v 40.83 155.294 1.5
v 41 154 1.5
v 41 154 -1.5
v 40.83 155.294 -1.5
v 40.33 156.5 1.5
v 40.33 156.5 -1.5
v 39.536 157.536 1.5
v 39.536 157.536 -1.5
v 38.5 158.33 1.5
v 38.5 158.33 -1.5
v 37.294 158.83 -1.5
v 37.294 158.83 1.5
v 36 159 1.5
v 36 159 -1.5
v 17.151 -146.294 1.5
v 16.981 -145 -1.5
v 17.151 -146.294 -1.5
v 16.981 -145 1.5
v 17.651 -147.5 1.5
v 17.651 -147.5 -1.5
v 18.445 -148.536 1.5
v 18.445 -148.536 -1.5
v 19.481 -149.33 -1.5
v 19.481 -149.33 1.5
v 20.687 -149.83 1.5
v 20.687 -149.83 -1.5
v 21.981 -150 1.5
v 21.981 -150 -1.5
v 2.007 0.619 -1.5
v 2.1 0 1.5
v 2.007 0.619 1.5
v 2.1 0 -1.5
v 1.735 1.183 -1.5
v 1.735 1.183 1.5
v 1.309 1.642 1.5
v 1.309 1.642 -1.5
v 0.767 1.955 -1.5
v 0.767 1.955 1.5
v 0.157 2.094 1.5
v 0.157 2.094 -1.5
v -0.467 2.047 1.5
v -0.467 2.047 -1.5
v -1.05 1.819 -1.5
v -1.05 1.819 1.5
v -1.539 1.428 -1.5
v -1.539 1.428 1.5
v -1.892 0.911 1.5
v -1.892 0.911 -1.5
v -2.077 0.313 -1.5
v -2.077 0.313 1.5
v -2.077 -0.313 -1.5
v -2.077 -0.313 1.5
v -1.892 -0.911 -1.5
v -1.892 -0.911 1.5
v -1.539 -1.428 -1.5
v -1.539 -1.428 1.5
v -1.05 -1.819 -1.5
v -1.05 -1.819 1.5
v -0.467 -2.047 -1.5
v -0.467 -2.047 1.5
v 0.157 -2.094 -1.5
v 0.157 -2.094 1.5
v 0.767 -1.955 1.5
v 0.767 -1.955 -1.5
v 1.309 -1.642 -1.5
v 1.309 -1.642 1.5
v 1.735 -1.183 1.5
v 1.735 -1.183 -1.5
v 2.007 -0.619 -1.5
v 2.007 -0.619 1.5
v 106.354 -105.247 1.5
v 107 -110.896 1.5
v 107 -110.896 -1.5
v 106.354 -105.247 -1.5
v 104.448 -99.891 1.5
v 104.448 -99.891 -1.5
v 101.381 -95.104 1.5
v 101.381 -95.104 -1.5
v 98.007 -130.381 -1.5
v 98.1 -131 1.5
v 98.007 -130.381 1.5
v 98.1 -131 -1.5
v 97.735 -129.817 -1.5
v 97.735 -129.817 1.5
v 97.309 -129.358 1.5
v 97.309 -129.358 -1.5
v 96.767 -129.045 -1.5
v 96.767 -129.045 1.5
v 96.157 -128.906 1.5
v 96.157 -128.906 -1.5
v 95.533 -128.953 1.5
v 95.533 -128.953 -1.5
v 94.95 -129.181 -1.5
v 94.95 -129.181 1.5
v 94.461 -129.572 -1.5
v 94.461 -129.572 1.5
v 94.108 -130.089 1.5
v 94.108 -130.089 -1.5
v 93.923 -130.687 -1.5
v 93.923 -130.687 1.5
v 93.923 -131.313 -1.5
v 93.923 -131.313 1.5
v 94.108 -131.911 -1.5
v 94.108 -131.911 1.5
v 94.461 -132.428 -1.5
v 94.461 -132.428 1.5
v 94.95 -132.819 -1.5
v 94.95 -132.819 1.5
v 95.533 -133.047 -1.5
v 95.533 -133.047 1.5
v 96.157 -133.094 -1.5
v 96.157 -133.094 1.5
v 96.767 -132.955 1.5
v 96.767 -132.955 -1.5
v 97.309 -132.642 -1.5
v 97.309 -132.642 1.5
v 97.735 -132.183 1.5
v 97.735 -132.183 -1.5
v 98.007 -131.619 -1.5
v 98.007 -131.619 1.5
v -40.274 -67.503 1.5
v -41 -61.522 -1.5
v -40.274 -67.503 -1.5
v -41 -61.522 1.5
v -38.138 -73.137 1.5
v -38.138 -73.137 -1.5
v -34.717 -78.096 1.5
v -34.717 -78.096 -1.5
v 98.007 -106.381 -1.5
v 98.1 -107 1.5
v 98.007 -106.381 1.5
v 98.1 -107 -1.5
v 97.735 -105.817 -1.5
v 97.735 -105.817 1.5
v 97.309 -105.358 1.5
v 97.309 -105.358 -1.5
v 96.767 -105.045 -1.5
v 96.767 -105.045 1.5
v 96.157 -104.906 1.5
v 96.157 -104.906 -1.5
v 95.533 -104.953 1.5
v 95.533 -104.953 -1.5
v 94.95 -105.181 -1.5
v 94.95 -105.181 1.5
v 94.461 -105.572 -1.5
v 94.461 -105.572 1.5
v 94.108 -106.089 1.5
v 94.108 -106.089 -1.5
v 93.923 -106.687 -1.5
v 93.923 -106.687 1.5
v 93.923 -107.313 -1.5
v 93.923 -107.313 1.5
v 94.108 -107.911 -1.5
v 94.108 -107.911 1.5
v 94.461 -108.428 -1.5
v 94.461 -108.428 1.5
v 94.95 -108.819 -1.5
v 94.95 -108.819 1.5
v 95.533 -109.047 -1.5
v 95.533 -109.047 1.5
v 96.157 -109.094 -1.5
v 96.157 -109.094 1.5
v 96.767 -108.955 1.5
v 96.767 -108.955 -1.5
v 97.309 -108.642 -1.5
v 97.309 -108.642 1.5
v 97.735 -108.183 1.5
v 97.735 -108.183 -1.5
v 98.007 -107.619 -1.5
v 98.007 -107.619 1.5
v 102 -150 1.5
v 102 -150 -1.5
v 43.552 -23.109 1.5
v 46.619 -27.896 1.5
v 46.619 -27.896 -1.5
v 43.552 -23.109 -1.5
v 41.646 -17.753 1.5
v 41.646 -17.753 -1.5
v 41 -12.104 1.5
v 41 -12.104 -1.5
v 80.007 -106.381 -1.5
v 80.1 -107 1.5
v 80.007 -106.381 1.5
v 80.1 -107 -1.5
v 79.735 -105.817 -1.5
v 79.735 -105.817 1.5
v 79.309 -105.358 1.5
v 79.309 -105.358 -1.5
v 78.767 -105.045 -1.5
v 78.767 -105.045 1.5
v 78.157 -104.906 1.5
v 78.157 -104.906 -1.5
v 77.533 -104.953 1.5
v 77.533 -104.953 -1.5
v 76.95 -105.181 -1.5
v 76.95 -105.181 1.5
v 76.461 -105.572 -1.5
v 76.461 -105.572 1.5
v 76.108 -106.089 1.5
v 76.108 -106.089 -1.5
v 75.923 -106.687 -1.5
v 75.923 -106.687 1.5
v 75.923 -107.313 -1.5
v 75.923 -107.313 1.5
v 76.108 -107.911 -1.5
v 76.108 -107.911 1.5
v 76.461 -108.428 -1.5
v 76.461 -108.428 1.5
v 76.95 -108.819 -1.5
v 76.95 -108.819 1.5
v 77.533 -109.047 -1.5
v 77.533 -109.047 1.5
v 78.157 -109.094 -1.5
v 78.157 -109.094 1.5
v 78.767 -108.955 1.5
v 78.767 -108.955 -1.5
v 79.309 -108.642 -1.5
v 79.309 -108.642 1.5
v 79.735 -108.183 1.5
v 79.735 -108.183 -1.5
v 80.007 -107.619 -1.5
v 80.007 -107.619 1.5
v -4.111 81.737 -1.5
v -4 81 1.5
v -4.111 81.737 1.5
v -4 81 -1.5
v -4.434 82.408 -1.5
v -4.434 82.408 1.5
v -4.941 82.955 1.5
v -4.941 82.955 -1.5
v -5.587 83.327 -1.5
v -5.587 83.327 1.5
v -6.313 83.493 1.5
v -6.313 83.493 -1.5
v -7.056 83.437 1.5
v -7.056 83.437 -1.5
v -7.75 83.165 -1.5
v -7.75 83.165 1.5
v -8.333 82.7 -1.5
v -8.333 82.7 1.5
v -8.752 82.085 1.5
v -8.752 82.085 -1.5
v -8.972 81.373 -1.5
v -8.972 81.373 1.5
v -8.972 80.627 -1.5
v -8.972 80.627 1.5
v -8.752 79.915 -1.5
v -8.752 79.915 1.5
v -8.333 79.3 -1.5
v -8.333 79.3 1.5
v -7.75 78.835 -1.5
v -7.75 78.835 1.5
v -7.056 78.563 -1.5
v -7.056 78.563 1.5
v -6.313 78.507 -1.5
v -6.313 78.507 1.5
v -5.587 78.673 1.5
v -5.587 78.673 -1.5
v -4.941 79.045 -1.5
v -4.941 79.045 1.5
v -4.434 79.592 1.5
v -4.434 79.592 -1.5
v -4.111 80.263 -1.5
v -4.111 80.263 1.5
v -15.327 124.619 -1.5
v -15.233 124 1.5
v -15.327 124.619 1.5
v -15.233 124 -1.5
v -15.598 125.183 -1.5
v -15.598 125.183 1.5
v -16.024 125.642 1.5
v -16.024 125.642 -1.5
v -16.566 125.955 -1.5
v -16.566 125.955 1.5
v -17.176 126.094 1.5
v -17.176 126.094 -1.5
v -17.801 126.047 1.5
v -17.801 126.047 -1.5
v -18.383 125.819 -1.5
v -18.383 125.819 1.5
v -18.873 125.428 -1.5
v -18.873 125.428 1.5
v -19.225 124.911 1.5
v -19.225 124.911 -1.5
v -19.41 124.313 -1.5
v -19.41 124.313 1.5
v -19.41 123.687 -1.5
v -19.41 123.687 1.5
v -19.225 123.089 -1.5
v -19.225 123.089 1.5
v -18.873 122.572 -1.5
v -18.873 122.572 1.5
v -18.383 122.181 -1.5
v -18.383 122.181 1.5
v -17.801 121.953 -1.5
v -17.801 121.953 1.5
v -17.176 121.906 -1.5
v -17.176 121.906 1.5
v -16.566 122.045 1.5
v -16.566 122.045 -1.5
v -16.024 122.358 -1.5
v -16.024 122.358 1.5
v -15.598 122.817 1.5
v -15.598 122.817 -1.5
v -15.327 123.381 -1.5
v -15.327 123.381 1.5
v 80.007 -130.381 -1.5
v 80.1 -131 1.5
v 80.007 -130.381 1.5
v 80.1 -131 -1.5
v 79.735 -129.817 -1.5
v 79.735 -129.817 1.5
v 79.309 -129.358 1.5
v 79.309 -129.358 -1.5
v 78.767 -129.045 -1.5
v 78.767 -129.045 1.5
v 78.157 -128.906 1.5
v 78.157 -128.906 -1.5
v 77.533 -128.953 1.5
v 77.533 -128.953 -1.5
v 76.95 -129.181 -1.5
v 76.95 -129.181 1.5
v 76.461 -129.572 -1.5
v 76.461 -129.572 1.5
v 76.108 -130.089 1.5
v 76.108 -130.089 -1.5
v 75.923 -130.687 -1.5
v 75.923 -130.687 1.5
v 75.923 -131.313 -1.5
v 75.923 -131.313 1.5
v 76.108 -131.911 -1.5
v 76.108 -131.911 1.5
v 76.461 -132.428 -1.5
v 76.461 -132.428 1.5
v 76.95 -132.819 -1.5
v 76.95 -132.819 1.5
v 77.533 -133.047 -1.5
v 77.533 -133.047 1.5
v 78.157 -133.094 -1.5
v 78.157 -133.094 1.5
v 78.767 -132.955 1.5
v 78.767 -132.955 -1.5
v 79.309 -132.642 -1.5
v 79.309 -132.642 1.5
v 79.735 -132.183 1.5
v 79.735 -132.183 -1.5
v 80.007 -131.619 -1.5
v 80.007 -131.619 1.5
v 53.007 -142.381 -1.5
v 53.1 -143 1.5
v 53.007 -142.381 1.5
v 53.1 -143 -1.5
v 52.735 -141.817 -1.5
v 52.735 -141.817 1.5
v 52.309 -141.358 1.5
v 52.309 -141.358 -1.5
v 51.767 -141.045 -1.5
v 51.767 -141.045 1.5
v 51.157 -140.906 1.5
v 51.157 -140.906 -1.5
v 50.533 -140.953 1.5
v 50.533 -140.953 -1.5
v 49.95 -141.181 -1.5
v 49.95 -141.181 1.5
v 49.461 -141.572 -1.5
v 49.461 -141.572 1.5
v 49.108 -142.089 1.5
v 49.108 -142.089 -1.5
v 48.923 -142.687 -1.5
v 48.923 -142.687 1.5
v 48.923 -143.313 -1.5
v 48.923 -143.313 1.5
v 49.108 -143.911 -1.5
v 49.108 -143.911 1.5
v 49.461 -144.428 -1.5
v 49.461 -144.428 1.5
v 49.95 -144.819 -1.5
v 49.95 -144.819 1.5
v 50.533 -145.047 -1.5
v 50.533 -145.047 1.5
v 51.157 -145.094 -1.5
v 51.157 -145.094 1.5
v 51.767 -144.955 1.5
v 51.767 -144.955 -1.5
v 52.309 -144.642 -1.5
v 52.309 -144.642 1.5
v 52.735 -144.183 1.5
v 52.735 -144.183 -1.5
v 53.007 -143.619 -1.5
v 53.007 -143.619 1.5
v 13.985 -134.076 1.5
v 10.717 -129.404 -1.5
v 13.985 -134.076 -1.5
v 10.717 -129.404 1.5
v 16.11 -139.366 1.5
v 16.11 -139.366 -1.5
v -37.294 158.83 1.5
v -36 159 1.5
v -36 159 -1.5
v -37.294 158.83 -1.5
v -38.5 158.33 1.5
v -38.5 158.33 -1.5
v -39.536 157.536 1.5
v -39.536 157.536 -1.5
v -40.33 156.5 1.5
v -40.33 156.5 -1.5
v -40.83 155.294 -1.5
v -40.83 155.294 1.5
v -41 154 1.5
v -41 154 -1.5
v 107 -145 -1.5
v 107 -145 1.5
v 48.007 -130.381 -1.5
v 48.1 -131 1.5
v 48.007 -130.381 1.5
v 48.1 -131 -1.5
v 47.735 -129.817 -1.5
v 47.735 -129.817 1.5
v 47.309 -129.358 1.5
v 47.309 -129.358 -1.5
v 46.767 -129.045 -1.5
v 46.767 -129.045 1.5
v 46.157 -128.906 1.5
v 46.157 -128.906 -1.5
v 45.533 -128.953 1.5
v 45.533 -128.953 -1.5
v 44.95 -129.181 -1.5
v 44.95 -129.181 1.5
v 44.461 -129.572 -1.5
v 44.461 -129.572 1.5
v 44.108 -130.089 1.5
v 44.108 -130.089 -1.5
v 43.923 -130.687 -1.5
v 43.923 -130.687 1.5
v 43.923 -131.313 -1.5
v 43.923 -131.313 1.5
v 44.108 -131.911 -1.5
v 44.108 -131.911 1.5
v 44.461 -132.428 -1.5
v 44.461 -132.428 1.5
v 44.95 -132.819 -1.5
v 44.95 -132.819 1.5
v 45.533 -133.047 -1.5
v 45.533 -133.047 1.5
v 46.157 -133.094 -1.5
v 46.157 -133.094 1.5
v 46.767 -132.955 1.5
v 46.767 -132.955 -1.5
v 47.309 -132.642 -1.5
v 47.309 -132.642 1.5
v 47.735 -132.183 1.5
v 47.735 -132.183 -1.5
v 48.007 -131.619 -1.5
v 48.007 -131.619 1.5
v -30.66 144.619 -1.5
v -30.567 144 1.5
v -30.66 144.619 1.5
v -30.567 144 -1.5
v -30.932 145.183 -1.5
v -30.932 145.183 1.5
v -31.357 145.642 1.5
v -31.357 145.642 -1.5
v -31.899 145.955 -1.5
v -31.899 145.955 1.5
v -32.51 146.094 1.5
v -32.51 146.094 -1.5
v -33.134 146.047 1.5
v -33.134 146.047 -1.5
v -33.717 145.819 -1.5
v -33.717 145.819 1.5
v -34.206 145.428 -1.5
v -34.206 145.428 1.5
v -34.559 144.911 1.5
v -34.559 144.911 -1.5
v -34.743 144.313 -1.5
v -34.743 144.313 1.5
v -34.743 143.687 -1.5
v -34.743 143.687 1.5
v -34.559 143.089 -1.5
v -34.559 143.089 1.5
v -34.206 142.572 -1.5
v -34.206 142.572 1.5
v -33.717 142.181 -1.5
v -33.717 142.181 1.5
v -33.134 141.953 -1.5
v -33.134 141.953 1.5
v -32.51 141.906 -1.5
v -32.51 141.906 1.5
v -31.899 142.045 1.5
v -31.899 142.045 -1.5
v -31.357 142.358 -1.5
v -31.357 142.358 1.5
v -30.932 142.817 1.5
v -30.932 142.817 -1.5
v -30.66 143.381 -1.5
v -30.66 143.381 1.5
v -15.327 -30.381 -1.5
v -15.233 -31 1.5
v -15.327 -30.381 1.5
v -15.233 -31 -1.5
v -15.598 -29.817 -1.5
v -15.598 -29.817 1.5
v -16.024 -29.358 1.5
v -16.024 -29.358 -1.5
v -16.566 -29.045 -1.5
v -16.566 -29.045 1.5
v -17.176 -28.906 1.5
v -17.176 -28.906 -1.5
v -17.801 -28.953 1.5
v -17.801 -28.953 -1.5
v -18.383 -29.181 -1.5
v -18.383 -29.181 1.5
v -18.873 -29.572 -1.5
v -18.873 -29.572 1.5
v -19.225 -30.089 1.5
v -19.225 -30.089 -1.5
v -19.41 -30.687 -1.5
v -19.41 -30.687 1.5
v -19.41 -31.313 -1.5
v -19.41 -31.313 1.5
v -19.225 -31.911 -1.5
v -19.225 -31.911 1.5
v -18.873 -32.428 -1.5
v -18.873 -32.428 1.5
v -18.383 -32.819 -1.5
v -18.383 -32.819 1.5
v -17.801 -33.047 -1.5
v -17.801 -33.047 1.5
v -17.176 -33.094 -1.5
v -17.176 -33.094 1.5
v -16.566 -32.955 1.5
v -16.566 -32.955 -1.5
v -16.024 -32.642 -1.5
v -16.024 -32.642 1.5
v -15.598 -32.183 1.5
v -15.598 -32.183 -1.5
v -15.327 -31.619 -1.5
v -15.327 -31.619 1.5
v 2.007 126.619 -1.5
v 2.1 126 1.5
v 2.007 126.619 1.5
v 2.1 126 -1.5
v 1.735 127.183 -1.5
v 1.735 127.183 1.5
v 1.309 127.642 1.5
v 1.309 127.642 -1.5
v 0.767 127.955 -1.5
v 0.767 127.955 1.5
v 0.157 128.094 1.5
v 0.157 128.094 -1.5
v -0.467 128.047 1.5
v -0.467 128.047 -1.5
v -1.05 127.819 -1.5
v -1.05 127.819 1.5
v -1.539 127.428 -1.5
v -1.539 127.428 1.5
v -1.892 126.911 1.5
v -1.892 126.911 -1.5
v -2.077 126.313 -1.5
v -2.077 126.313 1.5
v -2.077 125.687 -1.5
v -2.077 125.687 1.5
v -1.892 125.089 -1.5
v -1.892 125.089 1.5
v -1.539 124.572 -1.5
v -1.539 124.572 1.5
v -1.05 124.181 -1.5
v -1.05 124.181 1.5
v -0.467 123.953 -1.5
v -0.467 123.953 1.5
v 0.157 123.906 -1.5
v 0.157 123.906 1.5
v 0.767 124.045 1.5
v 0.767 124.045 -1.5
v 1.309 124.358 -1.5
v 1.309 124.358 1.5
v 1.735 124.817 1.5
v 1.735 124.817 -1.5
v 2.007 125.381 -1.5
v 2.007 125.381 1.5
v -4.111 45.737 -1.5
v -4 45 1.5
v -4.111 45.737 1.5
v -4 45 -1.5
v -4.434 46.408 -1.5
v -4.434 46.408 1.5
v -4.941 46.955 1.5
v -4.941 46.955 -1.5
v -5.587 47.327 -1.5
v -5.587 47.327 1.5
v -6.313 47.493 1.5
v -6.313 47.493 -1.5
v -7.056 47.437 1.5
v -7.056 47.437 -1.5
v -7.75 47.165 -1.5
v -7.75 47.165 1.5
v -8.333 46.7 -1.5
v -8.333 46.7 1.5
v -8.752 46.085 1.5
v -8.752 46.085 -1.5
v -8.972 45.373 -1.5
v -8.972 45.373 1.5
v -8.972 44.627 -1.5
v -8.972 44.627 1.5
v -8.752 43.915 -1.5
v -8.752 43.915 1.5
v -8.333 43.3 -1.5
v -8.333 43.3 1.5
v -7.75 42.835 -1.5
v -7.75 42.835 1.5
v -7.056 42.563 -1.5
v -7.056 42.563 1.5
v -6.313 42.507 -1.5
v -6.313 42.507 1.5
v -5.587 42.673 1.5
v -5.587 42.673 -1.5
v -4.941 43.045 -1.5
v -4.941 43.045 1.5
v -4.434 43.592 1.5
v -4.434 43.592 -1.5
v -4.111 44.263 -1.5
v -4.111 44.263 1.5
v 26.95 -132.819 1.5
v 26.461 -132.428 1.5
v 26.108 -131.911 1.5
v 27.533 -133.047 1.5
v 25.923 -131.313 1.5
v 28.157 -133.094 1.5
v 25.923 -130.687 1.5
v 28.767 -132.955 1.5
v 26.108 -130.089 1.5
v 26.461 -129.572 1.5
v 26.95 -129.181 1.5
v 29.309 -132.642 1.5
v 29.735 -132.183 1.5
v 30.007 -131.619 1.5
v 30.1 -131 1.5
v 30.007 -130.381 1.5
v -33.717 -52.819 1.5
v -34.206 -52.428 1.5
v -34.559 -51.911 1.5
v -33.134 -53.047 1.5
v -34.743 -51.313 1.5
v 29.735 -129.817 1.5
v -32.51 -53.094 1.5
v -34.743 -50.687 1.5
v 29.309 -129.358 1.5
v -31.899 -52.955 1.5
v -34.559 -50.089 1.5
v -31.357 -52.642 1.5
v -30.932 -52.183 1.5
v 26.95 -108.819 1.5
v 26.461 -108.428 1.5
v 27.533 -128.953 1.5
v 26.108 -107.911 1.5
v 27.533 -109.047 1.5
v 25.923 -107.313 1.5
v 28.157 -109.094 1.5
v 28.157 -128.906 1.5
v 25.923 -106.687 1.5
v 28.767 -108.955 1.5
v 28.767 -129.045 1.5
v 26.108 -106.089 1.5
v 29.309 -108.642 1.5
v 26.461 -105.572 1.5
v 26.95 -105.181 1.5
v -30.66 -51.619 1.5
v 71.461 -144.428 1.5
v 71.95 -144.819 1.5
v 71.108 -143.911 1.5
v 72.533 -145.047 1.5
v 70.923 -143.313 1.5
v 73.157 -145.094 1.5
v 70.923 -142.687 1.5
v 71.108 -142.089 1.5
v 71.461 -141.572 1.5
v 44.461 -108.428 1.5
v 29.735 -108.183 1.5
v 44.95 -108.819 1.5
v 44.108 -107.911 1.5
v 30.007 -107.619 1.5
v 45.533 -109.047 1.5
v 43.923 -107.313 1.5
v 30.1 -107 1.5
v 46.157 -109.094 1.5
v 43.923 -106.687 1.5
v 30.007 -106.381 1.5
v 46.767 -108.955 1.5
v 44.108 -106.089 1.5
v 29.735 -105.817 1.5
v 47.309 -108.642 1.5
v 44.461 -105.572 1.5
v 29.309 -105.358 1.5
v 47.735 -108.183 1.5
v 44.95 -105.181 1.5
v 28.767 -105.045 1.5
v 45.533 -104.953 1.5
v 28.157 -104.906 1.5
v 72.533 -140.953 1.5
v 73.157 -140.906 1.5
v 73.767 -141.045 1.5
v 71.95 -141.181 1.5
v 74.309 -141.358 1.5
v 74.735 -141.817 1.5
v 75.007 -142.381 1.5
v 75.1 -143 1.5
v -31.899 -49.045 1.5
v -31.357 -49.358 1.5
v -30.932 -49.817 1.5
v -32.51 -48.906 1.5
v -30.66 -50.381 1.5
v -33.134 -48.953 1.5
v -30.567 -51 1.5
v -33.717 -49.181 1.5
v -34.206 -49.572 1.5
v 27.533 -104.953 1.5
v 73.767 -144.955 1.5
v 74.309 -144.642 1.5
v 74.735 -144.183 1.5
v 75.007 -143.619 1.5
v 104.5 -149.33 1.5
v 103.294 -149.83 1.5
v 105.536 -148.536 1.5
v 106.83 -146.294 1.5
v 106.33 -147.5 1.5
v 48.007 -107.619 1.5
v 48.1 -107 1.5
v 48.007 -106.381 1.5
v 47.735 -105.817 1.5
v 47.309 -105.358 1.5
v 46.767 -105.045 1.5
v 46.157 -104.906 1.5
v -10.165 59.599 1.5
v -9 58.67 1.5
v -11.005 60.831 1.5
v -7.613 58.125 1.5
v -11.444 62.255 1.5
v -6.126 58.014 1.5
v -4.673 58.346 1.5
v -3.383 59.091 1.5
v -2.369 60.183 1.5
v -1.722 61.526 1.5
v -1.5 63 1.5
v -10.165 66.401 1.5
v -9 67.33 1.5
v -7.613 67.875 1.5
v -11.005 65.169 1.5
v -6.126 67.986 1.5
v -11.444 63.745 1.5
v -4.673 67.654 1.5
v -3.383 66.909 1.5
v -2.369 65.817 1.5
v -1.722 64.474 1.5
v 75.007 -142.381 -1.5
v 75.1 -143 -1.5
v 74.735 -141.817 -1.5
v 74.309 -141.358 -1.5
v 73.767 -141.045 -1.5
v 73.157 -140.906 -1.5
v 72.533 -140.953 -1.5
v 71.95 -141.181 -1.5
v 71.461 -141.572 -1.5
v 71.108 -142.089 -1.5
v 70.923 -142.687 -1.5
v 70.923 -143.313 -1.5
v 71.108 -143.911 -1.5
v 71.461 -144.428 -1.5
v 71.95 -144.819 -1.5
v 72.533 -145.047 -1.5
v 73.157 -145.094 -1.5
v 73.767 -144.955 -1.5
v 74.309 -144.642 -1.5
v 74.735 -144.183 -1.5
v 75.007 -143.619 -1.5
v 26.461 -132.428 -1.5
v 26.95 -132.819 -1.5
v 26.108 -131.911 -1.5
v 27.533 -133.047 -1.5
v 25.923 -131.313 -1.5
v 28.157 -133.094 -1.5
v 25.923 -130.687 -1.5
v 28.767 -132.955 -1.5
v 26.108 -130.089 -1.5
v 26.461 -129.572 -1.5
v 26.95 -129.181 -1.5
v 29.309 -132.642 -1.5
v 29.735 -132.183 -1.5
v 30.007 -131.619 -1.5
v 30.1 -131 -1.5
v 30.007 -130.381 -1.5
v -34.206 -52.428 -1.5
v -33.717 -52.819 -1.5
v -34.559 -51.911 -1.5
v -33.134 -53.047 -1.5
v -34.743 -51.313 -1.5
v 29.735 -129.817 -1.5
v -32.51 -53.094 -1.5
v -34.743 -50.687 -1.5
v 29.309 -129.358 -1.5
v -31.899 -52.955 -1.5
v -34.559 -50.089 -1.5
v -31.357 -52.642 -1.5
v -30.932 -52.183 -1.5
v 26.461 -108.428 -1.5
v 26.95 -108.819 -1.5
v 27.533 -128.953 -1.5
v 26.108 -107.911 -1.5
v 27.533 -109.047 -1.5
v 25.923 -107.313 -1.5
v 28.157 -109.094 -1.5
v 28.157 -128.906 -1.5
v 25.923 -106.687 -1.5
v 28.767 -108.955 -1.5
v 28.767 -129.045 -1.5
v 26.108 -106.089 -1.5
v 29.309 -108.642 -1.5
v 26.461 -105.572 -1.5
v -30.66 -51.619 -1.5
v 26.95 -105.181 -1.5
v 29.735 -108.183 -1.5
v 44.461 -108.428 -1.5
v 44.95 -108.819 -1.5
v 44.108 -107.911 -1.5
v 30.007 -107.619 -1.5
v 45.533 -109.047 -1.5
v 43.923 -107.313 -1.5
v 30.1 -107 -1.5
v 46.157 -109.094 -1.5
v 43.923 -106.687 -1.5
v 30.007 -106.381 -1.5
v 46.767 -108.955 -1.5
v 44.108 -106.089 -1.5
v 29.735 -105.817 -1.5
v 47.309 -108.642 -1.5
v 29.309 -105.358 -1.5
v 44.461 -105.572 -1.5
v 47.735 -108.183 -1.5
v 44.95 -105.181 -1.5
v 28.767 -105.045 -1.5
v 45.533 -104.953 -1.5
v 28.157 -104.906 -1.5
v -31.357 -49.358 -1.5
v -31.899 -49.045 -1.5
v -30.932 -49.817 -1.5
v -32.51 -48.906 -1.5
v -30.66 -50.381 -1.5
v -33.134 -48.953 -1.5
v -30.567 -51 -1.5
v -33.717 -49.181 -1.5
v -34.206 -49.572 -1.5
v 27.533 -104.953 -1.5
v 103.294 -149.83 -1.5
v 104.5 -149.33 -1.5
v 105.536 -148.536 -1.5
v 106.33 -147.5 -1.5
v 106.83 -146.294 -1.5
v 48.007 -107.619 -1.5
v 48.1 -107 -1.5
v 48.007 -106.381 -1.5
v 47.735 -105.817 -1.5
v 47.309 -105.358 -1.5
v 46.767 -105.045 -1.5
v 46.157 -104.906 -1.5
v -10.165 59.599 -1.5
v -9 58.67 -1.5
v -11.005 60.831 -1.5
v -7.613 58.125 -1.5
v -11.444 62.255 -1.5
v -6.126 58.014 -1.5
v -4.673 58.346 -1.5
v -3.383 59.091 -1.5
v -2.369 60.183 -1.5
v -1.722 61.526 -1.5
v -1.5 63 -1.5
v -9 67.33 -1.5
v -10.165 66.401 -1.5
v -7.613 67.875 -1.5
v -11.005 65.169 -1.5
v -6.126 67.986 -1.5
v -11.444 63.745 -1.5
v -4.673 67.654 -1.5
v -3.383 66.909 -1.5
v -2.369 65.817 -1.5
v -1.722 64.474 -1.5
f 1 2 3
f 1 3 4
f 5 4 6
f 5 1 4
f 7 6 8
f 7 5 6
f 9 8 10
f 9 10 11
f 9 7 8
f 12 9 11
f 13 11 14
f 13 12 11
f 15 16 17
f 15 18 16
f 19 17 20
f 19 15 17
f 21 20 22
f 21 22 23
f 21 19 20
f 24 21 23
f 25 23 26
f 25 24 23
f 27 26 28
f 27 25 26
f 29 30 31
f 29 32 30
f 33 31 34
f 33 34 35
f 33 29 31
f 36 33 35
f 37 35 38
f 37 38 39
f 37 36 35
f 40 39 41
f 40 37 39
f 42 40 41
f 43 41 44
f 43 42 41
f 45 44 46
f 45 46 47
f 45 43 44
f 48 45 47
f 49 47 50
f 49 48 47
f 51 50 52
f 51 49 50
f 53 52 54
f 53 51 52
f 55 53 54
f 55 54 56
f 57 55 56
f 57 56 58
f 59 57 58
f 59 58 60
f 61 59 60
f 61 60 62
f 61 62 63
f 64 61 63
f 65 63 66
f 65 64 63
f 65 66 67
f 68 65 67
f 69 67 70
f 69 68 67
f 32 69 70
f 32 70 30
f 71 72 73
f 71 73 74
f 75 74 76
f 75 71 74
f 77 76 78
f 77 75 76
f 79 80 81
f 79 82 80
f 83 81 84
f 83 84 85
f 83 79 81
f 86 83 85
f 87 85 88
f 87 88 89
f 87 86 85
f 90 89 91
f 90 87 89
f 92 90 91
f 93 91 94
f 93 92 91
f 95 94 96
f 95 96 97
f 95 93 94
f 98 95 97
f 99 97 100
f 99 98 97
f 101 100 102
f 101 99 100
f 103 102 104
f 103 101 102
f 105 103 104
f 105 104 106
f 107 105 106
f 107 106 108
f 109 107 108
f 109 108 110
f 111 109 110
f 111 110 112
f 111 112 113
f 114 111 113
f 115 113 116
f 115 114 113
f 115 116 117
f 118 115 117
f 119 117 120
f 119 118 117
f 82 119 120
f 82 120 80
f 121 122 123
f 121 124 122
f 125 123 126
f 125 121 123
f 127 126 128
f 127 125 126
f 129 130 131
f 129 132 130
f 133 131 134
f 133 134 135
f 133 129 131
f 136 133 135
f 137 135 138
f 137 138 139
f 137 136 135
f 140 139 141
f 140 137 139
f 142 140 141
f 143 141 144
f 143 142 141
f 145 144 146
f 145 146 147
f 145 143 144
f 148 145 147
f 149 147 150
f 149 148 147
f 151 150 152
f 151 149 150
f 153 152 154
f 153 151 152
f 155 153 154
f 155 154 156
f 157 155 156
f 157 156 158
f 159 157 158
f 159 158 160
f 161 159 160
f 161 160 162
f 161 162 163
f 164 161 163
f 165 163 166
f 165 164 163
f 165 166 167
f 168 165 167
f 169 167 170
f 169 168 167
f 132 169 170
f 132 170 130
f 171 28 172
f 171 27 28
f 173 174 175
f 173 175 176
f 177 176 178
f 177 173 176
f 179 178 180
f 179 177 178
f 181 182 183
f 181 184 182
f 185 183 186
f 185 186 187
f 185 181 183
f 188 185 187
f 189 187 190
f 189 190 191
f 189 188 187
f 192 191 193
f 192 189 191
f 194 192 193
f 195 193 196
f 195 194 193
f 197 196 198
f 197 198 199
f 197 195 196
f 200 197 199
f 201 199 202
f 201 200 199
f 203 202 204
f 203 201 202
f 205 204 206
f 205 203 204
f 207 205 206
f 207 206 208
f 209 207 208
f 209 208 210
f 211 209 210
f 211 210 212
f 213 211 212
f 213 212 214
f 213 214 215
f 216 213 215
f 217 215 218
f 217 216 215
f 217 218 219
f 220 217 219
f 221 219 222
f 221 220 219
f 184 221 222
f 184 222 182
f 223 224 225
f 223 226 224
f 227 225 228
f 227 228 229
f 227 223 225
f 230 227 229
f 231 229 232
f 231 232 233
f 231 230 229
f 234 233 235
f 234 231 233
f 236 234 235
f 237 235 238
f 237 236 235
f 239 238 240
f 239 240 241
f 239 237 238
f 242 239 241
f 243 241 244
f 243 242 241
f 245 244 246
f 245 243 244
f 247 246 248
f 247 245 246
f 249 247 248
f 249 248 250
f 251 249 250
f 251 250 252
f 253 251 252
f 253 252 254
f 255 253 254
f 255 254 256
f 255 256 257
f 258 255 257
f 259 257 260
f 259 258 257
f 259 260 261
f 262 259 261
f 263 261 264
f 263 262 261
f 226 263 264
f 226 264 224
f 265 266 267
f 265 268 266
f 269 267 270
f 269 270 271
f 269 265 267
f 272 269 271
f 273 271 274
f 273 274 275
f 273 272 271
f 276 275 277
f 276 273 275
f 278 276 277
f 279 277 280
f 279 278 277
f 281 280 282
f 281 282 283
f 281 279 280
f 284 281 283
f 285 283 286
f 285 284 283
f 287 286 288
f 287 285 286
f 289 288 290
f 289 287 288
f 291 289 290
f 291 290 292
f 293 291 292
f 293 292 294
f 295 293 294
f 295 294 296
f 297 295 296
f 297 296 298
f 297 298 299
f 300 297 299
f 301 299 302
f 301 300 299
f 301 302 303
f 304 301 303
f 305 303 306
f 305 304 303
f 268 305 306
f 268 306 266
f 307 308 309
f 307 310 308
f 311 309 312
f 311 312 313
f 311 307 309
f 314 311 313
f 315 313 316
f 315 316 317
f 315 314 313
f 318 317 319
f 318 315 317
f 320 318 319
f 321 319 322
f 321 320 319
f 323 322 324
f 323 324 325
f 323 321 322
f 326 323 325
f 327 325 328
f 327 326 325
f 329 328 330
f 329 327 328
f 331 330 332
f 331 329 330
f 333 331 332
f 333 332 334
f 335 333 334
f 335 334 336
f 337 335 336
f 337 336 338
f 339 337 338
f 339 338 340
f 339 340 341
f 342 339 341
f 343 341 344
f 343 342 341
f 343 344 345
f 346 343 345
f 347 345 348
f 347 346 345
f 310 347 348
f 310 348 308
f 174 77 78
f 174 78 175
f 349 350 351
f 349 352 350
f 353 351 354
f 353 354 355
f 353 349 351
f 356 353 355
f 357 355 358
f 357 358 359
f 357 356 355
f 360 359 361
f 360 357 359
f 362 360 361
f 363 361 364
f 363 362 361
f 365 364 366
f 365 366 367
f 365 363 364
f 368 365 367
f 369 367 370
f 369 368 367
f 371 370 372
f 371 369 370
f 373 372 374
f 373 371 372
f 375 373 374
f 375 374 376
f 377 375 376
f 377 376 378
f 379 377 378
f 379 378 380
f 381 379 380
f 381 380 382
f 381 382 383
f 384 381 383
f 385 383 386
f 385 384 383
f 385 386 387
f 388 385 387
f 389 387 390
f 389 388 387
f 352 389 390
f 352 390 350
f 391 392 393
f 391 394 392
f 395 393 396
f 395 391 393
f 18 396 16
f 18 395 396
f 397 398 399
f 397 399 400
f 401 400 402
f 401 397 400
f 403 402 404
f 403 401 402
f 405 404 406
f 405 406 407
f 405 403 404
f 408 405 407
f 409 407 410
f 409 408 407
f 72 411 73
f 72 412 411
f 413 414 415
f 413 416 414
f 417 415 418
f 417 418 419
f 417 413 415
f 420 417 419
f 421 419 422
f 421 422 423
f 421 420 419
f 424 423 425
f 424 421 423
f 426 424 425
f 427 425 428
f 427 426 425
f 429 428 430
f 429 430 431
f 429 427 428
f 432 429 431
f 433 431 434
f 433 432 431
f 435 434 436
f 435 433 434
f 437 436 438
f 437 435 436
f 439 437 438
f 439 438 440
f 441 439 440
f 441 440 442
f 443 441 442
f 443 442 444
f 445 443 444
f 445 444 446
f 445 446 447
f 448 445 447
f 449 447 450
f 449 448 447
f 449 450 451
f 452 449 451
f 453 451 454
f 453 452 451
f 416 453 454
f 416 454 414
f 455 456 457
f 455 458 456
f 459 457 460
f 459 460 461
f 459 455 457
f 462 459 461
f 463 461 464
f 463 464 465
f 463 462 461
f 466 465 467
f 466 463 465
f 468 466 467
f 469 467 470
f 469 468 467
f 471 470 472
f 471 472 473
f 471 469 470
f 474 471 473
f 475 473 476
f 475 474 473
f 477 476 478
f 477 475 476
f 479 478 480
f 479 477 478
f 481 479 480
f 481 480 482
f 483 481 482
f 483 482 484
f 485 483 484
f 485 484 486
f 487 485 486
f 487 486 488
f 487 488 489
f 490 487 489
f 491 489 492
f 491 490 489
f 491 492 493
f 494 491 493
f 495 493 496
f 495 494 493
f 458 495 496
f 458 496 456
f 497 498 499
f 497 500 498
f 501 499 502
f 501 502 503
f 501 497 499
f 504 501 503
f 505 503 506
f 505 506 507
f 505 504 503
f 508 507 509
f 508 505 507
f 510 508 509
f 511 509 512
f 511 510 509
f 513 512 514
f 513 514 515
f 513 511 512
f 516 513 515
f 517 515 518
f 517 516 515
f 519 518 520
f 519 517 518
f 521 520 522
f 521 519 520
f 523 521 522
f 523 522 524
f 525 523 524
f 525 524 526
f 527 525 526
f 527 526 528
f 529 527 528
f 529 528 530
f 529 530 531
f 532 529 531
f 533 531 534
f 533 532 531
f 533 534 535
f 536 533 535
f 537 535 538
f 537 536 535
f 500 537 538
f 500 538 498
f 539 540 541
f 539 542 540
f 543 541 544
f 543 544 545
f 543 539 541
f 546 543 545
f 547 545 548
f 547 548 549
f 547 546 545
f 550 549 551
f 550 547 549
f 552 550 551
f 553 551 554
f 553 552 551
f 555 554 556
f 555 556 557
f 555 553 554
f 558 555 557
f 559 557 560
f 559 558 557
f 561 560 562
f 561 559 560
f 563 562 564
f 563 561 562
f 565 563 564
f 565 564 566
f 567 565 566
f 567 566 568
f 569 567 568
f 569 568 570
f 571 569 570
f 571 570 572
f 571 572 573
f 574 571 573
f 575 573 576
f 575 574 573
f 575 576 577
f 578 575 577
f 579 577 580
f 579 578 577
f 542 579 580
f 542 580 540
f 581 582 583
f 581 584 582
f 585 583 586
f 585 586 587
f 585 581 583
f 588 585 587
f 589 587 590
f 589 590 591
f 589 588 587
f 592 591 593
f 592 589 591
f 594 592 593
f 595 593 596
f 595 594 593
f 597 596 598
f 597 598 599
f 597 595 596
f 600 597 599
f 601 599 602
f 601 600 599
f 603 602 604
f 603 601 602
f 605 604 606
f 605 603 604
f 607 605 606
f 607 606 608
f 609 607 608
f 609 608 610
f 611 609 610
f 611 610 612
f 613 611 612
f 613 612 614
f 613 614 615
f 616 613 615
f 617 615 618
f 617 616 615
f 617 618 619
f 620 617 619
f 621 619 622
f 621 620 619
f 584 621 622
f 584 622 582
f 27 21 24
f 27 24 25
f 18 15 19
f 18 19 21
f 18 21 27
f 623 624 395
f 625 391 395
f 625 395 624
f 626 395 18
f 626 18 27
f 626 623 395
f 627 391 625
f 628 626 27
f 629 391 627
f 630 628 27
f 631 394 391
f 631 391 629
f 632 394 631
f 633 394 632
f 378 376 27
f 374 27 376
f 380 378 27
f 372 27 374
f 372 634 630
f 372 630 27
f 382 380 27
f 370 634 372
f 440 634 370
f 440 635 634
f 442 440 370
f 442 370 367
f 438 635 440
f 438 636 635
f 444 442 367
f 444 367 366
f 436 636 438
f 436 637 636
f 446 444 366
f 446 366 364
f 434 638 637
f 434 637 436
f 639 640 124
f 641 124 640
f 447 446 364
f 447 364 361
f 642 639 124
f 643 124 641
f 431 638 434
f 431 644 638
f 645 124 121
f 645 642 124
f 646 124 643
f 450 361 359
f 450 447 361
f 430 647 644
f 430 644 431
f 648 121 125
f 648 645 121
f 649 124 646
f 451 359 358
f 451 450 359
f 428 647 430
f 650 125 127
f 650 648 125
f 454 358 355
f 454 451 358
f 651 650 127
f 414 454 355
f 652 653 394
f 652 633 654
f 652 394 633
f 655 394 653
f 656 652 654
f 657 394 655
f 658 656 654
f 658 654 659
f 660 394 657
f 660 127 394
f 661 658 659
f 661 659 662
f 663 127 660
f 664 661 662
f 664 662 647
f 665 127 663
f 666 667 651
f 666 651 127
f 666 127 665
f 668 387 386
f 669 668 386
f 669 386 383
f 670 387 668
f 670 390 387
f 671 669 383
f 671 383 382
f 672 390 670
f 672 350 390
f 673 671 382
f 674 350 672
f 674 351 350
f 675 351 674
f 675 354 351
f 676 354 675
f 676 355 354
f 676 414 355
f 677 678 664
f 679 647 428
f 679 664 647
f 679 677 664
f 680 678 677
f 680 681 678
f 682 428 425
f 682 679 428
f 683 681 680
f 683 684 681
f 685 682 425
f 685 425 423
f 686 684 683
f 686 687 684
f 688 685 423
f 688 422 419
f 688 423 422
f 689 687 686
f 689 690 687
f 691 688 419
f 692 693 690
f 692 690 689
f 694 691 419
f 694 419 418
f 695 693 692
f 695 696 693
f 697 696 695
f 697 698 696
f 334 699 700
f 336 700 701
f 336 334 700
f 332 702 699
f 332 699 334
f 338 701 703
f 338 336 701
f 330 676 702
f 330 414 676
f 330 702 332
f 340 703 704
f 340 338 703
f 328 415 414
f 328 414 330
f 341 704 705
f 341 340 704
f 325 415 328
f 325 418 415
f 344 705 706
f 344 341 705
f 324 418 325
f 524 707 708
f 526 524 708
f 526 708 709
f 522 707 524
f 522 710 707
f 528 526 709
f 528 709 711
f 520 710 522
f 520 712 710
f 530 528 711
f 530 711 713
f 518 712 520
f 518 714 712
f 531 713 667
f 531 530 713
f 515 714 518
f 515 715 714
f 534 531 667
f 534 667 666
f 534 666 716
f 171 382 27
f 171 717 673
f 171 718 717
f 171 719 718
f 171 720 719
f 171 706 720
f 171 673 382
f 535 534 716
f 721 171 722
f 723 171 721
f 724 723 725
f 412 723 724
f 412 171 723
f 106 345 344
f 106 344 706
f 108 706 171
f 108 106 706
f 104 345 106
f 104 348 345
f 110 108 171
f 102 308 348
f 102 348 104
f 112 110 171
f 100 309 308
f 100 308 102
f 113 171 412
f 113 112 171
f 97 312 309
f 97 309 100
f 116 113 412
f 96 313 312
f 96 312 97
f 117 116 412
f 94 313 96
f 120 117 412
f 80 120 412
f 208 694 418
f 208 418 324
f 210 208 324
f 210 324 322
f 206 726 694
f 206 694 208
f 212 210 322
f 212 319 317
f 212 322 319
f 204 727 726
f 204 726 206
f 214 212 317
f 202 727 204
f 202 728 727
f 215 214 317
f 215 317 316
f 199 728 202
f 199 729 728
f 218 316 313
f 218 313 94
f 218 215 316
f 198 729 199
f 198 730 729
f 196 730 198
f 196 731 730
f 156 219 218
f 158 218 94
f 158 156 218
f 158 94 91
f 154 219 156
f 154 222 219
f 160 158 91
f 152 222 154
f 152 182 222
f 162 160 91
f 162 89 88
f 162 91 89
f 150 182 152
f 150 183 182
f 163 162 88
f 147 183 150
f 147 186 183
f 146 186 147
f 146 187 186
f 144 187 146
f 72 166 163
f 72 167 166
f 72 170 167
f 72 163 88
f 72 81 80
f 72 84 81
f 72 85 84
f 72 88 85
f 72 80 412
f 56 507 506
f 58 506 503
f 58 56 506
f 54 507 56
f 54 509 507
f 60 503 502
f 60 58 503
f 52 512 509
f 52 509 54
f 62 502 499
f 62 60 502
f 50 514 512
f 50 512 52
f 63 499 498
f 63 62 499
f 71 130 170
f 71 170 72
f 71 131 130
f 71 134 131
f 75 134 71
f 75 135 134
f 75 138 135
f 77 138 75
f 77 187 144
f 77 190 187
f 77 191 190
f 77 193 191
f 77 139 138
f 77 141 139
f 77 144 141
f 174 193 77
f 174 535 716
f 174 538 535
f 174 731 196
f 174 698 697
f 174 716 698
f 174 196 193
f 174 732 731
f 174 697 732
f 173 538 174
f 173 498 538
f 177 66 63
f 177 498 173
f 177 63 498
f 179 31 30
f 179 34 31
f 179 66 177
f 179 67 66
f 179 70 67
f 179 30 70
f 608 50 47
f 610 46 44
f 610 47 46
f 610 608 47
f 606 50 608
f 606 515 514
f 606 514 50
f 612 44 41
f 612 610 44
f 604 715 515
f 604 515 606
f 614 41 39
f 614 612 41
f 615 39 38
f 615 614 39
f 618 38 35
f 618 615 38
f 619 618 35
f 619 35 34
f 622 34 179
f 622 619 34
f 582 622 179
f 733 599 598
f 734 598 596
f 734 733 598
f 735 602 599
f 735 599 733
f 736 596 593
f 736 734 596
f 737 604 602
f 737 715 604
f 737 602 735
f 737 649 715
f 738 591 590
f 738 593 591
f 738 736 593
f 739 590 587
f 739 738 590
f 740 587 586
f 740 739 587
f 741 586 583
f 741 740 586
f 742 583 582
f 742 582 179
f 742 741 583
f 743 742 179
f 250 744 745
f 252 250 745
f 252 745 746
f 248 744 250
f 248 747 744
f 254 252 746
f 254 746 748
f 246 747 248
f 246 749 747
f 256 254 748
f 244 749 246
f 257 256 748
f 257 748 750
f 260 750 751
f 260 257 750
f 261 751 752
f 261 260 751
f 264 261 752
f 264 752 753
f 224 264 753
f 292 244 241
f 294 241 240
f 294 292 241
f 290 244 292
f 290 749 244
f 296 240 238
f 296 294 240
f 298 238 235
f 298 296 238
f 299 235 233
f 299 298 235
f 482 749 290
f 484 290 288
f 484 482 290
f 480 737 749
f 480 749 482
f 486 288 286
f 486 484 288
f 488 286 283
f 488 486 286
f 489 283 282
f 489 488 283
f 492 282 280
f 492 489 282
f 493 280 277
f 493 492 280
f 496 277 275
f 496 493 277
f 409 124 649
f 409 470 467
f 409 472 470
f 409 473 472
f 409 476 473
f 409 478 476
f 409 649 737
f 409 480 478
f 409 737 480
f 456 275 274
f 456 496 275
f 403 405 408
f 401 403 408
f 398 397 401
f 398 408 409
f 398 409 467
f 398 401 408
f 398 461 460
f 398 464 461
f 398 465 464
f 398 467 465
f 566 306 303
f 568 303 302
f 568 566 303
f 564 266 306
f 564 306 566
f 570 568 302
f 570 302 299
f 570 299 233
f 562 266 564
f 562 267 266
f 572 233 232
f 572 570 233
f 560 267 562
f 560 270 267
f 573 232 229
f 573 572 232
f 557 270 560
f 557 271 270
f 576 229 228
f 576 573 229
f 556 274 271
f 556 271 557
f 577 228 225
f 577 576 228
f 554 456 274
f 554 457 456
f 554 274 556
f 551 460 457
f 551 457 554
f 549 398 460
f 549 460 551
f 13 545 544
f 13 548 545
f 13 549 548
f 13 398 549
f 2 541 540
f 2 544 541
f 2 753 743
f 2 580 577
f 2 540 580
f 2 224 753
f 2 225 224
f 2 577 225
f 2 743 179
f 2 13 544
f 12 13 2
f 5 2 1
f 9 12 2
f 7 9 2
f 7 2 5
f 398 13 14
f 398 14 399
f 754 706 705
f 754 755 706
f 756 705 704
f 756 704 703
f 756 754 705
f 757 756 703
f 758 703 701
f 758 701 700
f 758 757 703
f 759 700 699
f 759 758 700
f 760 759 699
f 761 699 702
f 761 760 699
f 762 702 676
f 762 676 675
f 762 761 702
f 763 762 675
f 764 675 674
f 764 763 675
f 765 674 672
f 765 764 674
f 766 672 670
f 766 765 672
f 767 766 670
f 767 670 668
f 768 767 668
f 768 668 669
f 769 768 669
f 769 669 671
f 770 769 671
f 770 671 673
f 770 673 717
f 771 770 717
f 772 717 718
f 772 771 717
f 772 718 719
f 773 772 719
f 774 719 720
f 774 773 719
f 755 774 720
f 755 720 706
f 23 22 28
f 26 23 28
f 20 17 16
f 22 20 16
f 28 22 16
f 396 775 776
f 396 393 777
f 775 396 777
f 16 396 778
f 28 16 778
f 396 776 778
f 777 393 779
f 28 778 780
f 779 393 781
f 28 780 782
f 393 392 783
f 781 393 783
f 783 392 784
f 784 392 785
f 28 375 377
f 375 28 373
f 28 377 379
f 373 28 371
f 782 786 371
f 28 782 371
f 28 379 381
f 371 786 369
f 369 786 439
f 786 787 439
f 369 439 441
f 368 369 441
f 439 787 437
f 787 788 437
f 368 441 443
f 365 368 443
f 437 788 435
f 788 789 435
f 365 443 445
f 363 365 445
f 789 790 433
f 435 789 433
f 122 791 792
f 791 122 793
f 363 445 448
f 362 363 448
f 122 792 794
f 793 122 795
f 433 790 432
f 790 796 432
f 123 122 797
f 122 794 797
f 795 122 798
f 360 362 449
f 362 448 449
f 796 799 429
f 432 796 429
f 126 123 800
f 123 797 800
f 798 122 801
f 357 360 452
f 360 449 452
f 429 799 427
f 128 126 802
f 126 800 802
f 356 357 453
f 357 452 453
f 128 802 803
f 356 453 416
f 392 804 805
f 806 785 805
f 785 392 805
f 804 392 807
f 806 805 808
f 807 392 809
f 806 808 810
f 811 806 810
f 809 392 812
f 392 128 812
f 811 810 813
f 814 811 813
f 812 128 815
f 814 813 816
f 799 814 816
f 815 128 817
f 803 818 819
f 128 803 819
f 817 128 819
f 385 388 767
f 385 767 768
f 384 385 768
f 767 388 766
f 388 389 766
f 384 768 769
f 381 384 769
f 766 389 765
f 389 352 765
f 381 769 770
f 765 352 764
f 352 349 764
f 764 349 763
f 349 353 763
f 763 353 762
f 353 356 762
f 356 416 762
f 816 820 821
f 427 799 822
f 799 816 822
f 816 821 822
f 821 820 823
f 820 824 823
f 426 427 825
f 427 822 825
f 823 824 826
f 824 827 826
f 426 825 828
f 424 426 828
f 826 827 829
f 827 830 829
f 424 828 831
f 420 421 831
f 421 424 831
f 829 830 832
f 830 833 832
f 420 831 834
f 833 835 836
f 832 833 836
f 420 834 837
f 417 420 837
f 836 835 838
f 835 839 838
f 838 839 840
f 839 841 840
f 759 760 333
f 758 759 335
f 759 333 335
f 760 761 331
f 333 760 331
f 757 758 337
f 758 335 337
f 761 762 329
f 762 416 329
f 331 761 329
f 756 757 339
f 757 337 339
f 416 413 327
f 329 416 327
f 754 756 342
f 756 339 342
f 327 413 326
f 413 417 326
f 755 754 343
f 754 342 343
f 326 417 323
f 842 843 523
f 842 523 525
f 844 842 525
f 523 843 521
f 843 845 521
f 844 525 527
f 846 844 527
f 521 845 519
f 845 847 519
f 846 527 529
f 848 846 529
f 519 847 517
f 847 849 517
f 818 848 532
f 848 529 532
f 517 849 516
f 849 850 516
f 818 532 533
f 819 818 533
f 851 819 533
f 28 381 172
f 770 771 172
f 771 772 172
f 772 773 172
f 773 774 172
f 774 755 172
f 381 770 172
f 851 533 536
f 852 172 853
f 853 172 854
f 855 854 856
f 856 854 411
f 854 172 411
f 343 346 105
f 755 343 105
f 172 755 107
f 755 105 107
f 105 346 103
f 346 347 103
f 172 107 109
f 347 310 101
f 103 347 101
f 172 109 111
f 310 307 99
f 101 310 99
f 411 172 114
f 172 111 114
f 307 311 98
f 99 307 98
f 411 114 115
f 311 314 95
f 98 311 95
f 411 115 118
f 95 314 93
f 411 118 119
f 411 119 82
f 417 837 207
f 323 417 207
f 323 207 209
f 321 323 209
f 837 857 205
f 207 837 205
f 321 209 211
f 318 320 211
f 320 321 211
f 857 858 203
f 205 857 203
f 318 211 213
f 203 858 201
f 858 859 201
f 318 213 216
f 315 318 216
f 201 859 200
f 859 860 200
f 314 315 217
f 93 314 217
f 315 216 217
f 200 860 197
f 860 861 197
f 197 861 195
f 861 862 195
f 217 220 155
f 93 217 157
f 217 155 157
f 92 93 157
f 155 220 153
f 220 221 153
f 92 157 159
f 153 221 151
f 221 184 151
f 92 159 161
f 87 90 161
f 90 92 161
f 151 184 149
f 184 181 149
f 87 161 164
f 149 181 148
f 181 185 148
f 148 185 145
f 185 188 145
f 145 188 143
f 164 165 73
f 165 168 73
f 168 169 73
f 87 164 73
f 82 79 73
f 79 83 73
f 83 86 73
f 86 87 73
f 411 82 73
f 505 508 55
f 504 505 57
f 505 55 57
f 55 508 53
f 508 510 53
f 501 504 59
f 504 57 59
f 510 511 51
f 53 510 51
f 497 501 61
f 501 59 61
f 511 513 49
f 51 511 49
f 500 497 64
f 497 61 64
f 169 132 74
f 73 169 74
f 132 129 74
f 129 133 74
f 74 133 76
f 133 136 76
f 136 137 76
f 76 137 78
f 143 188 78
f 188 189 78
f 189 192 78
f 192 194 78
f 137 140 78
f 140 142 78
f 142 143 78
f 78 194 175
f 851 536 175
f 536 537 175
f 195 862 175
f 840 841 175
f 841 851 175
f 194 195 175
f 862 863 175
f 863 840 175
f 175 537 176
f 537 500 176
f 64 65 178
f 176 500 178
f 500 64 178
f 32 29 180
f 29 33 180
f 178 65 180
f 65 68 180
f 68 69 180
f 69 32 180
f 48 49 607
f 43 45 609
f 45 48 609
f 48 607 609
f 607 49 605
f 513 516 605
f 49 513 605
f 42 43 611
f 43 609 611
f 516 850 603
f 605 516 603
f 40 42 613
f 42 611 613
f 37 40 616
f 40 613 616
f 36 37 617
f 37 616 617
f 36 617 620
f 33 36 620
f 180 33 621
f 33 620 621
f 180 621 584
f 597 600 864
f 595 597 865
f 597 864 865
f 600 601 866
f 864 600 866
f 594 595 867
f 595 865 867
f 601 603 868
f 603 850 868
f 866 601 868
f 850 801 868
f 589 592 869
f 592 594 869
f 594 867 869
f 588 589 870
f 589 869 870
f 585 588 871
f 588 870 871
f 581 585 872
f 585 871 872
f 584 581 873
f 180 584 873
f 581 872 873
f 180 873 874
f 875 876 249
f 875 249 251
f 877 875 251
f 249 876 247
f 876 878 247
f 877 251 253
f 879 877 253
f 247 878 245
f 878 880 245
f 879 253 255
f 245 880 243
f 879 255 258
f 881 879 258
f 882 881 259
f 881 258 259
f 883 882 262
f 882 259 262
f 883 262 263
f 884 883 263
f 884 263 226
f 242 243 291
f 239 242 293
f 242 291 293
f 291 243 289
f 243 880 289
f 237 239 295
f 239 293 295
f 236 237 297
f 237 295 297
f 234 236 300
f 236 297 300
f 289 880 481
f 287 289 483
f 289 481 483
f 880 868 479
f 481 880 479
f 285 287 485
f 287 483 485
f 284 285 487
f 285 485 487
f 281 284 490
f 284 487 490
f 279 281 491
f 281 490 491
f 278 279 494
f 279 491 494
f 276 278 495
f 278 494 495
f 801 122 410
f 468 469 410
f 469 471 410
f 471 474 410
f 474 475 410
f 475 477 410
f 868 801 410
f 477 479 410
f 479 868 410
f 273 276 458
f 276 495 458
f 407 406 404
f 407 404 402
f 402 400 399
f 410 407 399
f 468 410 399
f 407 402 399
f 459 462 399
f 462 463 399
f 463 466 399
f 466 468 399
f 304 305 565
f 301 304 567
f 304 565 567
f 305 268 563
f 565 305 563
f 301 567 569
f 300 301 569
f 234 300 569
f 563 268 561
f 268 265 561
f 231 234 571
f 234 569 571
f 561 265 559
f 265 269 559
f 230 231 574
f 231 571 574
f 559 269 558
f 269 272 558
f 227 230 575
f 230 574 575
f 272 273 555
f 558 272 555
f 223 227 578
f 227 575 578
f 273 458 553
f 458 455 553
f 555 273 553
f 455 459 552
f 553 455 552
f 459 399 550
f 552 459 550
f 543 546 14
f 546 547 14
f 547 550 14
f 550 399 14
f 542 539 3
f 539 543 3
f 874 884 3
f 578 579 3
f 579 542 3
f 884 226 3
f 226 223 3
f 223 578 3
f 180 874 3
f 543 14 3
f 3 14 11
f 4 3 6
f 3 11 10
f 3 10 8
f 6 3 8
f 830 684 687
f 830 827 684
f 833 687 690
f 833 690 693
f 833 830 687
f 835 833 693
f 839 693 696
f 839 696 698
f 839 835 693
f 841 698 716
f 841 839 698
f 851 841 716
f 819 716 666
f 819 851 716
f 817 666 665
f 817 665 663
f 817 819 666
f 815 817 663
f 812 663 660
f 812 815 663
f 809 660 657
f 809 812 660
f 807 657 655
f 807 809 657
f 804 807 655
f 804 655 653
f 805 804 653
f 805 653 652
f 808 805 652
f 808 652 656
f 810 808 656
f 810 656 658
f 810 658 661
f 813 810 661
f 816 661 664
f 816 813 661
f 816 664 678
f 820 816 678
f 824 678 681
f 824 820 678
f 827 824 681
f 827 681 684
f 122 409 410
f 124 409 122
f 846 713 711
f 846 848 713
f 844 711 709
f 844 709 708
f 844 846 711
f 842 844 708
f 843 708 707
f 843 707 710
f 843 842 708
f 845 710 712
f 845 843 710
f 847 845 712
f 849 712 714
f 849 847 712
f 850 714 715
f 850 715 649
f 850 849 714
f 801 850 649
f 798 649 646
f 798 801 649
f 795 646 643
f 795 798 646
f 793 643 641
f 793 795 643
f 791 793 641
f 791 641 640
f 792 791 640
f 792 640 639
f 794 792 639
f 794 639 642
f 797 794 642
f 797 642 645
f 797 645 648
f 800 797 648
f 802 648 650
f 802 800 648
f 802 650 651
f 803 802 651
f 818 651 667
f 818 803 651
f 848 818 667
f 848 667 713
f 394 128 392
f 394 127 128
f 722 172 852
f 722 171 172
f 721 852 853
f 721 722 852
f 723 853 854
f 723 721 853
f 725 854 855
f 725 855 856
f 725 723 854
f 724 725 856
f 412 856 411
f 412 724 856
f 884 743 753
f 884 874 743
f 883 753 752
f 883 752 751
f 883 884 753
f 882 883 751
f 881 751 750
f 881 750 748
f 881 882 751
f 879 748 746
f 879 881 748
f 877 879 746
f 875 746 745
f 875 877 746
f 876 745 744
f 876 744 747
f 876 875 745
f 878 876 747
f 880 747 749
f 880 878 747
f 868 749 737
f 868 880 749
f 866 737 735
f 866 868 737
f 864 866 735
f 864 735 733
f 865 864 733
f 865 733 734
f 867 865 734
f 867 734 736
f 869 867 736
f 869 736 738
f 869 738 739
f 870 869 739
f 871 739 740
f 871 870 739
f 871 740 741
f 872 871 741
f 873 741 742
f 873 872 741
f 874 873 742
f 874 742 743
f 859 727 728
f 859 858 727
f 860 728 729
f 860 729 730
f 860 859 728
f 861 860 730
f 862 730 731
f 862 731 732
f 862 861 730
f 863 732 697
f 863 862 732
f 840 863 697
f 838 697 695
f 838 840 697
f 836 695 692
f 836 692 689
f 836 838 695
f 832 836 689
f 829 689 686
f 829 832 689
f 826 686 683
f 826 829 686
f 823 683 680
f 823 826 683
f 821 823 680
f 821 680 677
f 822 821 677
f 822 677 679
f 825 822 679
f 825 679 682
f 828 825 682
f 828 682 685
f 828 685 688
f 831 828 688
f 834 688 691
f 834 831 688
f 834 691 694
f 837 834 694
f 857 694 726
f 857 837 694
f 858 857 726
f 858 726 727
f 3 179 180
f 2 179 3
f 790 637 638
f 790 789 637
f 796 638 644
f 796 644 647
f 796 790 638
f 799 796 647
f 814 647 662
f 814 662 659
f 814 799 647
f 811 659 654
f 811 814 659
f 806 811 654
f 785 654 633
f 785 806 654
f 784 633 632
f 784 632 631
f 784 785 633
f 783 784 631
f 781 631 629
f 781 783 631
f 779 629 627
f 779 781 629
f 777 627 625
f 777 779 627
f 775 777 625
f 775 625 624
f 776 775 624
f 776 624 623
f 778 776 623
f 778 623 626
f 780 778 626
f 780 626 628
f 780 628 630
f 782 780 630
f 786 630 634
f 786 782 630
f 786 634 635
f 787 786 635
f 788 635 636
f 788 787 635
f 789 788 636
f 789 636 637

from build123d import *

# Parameters (mm, degrees)
SKETCH1_R           = 2.1
SKETCH1_R_2         = 2.5
SKETCH1_R_3         = 5
BOSS_EXTRUDE1_DEPTH = 1.5


with BuildPart() as part:
    # Sketch1 → Boss-Extrude1 (new body, symmetric)
    with BuildSketch(Plane.XY):
        with BuildLine():
            Line((107, -145), (107, -110.895624471))
            ThreePointArc((107, -110.895624471), (105.553363517, -102.514749396), (101.380874638, -95.103800692))
            Line((101.380874638, -95.103800692), (46.619125362, -27.896199308))
            ThreePointArc((46.619125362, -27.896199308), (42.446636483, -20.485250604), (41, -12.104375529))
            Line((41, -12.104375529), (41, 154))
            ThreePointArc((41, 154), (39.535533906, 157.535533906), (36, 159))
            Line((36, 159), (-36, 159))
            ThreePointArc((-36, 159), (-39.535533906, 157.535533906), (-41, 154))
            Line((-41, 154), (-41, -61.522167809))
            ThreePointArc((-41, -61.522167809), (-39.376465331, -70.384496434), (-34.716730508, -78.095761236))
            Line((-34.716730508, -78.095761236), (10.716730508, -129.404238764))
            ThreePointArc((10.716730508, -129.404238764), (15.198642313, -136.659946441), (16.980869565, -145))
            ThreePointArc((16.980869565, -145), (18.445335659, -148.535533906), (21.980869565, -150))
            Line((21.980869565, -150), (102, -150))
            ThreePointArc((102, -150), (105.535533906, -148.535533906), (107, -145))
        make_face()
        with Locations((96, -107)):
            Circle(SKETCH1_R, mode=Mode.SUBTRACT)
        with Locations((96, -131)):
            Circle(SKETCH1_R, mode=Mode.SUBTRACT)
        with Locations((78, -107)):
            Circle(SKETCH1_R, mode=Mode.SUBTRACT)
        with Locations((78, -131)):
            Circle(SKETCH1_R, mode=Mode.SUBTRACT)
        with Locations((46, -107)):
            Circle(SKETCH1_R, mode=Mode.SUBTRACT)
        with Locations((46, -131)):
            Circle(SKETCH1_R, mode=Mode.SUBTRACT)
        with Locations((28, -107)):
            Circle(SKETCH1_R, mode=Mode.SUBTRACT)
        with Locations((28, -131)):
            Circle(SKETCH1_R, mode=Mode.SUBTRACT)
        with Locations((-6.5, 81)):
            Circle(SKETCH1_R_2, mode=Mode.SUBTRACT)
        with Locations((-6.5, 45)):
            Circle(SKETCH1_R_2, mode=Mode.SUBTRACT)
        with Locations((-6.5, 63)):
            Circle(SKETCH1_R_3, mode=Mode.SUBTRACT)
        with Locations((51, -143)):
            Circle(SKETCH1_R, mode=Mode.SUBTRACT)
        with Locations((73, -143)):
            Circle(SKETCH1_R, mode=Mode.SUBTRACT)
        with Locations((0, 126)):
            Circle(SKETCH1_R, mode=Mode.SUBTRACT)
        Circle(SKETCH1_R, mode=Mode.SUBTRACT)
        with Locations((-32.666666667, 144)):
            Circle(SKETCH1_R, mode=Mode.SUBTRACT)
        with Locations((-17.333333333, 124)):
            Circle(SKETCH1_R, mode=Mode.SUBTRACT)
        with Locations((-17.333333333, -31)):
            Circle(SKETCH1_R, mode=Mode.SUBTRACT)
        with Locations((-32.666666667, -51)):
            Circle(SKETCH1_R, mode=Mode.SUBTRACT)
    extrude(amount=BOSS_EXTRUDE1_DEPTH, both=True)


solid = part.part
